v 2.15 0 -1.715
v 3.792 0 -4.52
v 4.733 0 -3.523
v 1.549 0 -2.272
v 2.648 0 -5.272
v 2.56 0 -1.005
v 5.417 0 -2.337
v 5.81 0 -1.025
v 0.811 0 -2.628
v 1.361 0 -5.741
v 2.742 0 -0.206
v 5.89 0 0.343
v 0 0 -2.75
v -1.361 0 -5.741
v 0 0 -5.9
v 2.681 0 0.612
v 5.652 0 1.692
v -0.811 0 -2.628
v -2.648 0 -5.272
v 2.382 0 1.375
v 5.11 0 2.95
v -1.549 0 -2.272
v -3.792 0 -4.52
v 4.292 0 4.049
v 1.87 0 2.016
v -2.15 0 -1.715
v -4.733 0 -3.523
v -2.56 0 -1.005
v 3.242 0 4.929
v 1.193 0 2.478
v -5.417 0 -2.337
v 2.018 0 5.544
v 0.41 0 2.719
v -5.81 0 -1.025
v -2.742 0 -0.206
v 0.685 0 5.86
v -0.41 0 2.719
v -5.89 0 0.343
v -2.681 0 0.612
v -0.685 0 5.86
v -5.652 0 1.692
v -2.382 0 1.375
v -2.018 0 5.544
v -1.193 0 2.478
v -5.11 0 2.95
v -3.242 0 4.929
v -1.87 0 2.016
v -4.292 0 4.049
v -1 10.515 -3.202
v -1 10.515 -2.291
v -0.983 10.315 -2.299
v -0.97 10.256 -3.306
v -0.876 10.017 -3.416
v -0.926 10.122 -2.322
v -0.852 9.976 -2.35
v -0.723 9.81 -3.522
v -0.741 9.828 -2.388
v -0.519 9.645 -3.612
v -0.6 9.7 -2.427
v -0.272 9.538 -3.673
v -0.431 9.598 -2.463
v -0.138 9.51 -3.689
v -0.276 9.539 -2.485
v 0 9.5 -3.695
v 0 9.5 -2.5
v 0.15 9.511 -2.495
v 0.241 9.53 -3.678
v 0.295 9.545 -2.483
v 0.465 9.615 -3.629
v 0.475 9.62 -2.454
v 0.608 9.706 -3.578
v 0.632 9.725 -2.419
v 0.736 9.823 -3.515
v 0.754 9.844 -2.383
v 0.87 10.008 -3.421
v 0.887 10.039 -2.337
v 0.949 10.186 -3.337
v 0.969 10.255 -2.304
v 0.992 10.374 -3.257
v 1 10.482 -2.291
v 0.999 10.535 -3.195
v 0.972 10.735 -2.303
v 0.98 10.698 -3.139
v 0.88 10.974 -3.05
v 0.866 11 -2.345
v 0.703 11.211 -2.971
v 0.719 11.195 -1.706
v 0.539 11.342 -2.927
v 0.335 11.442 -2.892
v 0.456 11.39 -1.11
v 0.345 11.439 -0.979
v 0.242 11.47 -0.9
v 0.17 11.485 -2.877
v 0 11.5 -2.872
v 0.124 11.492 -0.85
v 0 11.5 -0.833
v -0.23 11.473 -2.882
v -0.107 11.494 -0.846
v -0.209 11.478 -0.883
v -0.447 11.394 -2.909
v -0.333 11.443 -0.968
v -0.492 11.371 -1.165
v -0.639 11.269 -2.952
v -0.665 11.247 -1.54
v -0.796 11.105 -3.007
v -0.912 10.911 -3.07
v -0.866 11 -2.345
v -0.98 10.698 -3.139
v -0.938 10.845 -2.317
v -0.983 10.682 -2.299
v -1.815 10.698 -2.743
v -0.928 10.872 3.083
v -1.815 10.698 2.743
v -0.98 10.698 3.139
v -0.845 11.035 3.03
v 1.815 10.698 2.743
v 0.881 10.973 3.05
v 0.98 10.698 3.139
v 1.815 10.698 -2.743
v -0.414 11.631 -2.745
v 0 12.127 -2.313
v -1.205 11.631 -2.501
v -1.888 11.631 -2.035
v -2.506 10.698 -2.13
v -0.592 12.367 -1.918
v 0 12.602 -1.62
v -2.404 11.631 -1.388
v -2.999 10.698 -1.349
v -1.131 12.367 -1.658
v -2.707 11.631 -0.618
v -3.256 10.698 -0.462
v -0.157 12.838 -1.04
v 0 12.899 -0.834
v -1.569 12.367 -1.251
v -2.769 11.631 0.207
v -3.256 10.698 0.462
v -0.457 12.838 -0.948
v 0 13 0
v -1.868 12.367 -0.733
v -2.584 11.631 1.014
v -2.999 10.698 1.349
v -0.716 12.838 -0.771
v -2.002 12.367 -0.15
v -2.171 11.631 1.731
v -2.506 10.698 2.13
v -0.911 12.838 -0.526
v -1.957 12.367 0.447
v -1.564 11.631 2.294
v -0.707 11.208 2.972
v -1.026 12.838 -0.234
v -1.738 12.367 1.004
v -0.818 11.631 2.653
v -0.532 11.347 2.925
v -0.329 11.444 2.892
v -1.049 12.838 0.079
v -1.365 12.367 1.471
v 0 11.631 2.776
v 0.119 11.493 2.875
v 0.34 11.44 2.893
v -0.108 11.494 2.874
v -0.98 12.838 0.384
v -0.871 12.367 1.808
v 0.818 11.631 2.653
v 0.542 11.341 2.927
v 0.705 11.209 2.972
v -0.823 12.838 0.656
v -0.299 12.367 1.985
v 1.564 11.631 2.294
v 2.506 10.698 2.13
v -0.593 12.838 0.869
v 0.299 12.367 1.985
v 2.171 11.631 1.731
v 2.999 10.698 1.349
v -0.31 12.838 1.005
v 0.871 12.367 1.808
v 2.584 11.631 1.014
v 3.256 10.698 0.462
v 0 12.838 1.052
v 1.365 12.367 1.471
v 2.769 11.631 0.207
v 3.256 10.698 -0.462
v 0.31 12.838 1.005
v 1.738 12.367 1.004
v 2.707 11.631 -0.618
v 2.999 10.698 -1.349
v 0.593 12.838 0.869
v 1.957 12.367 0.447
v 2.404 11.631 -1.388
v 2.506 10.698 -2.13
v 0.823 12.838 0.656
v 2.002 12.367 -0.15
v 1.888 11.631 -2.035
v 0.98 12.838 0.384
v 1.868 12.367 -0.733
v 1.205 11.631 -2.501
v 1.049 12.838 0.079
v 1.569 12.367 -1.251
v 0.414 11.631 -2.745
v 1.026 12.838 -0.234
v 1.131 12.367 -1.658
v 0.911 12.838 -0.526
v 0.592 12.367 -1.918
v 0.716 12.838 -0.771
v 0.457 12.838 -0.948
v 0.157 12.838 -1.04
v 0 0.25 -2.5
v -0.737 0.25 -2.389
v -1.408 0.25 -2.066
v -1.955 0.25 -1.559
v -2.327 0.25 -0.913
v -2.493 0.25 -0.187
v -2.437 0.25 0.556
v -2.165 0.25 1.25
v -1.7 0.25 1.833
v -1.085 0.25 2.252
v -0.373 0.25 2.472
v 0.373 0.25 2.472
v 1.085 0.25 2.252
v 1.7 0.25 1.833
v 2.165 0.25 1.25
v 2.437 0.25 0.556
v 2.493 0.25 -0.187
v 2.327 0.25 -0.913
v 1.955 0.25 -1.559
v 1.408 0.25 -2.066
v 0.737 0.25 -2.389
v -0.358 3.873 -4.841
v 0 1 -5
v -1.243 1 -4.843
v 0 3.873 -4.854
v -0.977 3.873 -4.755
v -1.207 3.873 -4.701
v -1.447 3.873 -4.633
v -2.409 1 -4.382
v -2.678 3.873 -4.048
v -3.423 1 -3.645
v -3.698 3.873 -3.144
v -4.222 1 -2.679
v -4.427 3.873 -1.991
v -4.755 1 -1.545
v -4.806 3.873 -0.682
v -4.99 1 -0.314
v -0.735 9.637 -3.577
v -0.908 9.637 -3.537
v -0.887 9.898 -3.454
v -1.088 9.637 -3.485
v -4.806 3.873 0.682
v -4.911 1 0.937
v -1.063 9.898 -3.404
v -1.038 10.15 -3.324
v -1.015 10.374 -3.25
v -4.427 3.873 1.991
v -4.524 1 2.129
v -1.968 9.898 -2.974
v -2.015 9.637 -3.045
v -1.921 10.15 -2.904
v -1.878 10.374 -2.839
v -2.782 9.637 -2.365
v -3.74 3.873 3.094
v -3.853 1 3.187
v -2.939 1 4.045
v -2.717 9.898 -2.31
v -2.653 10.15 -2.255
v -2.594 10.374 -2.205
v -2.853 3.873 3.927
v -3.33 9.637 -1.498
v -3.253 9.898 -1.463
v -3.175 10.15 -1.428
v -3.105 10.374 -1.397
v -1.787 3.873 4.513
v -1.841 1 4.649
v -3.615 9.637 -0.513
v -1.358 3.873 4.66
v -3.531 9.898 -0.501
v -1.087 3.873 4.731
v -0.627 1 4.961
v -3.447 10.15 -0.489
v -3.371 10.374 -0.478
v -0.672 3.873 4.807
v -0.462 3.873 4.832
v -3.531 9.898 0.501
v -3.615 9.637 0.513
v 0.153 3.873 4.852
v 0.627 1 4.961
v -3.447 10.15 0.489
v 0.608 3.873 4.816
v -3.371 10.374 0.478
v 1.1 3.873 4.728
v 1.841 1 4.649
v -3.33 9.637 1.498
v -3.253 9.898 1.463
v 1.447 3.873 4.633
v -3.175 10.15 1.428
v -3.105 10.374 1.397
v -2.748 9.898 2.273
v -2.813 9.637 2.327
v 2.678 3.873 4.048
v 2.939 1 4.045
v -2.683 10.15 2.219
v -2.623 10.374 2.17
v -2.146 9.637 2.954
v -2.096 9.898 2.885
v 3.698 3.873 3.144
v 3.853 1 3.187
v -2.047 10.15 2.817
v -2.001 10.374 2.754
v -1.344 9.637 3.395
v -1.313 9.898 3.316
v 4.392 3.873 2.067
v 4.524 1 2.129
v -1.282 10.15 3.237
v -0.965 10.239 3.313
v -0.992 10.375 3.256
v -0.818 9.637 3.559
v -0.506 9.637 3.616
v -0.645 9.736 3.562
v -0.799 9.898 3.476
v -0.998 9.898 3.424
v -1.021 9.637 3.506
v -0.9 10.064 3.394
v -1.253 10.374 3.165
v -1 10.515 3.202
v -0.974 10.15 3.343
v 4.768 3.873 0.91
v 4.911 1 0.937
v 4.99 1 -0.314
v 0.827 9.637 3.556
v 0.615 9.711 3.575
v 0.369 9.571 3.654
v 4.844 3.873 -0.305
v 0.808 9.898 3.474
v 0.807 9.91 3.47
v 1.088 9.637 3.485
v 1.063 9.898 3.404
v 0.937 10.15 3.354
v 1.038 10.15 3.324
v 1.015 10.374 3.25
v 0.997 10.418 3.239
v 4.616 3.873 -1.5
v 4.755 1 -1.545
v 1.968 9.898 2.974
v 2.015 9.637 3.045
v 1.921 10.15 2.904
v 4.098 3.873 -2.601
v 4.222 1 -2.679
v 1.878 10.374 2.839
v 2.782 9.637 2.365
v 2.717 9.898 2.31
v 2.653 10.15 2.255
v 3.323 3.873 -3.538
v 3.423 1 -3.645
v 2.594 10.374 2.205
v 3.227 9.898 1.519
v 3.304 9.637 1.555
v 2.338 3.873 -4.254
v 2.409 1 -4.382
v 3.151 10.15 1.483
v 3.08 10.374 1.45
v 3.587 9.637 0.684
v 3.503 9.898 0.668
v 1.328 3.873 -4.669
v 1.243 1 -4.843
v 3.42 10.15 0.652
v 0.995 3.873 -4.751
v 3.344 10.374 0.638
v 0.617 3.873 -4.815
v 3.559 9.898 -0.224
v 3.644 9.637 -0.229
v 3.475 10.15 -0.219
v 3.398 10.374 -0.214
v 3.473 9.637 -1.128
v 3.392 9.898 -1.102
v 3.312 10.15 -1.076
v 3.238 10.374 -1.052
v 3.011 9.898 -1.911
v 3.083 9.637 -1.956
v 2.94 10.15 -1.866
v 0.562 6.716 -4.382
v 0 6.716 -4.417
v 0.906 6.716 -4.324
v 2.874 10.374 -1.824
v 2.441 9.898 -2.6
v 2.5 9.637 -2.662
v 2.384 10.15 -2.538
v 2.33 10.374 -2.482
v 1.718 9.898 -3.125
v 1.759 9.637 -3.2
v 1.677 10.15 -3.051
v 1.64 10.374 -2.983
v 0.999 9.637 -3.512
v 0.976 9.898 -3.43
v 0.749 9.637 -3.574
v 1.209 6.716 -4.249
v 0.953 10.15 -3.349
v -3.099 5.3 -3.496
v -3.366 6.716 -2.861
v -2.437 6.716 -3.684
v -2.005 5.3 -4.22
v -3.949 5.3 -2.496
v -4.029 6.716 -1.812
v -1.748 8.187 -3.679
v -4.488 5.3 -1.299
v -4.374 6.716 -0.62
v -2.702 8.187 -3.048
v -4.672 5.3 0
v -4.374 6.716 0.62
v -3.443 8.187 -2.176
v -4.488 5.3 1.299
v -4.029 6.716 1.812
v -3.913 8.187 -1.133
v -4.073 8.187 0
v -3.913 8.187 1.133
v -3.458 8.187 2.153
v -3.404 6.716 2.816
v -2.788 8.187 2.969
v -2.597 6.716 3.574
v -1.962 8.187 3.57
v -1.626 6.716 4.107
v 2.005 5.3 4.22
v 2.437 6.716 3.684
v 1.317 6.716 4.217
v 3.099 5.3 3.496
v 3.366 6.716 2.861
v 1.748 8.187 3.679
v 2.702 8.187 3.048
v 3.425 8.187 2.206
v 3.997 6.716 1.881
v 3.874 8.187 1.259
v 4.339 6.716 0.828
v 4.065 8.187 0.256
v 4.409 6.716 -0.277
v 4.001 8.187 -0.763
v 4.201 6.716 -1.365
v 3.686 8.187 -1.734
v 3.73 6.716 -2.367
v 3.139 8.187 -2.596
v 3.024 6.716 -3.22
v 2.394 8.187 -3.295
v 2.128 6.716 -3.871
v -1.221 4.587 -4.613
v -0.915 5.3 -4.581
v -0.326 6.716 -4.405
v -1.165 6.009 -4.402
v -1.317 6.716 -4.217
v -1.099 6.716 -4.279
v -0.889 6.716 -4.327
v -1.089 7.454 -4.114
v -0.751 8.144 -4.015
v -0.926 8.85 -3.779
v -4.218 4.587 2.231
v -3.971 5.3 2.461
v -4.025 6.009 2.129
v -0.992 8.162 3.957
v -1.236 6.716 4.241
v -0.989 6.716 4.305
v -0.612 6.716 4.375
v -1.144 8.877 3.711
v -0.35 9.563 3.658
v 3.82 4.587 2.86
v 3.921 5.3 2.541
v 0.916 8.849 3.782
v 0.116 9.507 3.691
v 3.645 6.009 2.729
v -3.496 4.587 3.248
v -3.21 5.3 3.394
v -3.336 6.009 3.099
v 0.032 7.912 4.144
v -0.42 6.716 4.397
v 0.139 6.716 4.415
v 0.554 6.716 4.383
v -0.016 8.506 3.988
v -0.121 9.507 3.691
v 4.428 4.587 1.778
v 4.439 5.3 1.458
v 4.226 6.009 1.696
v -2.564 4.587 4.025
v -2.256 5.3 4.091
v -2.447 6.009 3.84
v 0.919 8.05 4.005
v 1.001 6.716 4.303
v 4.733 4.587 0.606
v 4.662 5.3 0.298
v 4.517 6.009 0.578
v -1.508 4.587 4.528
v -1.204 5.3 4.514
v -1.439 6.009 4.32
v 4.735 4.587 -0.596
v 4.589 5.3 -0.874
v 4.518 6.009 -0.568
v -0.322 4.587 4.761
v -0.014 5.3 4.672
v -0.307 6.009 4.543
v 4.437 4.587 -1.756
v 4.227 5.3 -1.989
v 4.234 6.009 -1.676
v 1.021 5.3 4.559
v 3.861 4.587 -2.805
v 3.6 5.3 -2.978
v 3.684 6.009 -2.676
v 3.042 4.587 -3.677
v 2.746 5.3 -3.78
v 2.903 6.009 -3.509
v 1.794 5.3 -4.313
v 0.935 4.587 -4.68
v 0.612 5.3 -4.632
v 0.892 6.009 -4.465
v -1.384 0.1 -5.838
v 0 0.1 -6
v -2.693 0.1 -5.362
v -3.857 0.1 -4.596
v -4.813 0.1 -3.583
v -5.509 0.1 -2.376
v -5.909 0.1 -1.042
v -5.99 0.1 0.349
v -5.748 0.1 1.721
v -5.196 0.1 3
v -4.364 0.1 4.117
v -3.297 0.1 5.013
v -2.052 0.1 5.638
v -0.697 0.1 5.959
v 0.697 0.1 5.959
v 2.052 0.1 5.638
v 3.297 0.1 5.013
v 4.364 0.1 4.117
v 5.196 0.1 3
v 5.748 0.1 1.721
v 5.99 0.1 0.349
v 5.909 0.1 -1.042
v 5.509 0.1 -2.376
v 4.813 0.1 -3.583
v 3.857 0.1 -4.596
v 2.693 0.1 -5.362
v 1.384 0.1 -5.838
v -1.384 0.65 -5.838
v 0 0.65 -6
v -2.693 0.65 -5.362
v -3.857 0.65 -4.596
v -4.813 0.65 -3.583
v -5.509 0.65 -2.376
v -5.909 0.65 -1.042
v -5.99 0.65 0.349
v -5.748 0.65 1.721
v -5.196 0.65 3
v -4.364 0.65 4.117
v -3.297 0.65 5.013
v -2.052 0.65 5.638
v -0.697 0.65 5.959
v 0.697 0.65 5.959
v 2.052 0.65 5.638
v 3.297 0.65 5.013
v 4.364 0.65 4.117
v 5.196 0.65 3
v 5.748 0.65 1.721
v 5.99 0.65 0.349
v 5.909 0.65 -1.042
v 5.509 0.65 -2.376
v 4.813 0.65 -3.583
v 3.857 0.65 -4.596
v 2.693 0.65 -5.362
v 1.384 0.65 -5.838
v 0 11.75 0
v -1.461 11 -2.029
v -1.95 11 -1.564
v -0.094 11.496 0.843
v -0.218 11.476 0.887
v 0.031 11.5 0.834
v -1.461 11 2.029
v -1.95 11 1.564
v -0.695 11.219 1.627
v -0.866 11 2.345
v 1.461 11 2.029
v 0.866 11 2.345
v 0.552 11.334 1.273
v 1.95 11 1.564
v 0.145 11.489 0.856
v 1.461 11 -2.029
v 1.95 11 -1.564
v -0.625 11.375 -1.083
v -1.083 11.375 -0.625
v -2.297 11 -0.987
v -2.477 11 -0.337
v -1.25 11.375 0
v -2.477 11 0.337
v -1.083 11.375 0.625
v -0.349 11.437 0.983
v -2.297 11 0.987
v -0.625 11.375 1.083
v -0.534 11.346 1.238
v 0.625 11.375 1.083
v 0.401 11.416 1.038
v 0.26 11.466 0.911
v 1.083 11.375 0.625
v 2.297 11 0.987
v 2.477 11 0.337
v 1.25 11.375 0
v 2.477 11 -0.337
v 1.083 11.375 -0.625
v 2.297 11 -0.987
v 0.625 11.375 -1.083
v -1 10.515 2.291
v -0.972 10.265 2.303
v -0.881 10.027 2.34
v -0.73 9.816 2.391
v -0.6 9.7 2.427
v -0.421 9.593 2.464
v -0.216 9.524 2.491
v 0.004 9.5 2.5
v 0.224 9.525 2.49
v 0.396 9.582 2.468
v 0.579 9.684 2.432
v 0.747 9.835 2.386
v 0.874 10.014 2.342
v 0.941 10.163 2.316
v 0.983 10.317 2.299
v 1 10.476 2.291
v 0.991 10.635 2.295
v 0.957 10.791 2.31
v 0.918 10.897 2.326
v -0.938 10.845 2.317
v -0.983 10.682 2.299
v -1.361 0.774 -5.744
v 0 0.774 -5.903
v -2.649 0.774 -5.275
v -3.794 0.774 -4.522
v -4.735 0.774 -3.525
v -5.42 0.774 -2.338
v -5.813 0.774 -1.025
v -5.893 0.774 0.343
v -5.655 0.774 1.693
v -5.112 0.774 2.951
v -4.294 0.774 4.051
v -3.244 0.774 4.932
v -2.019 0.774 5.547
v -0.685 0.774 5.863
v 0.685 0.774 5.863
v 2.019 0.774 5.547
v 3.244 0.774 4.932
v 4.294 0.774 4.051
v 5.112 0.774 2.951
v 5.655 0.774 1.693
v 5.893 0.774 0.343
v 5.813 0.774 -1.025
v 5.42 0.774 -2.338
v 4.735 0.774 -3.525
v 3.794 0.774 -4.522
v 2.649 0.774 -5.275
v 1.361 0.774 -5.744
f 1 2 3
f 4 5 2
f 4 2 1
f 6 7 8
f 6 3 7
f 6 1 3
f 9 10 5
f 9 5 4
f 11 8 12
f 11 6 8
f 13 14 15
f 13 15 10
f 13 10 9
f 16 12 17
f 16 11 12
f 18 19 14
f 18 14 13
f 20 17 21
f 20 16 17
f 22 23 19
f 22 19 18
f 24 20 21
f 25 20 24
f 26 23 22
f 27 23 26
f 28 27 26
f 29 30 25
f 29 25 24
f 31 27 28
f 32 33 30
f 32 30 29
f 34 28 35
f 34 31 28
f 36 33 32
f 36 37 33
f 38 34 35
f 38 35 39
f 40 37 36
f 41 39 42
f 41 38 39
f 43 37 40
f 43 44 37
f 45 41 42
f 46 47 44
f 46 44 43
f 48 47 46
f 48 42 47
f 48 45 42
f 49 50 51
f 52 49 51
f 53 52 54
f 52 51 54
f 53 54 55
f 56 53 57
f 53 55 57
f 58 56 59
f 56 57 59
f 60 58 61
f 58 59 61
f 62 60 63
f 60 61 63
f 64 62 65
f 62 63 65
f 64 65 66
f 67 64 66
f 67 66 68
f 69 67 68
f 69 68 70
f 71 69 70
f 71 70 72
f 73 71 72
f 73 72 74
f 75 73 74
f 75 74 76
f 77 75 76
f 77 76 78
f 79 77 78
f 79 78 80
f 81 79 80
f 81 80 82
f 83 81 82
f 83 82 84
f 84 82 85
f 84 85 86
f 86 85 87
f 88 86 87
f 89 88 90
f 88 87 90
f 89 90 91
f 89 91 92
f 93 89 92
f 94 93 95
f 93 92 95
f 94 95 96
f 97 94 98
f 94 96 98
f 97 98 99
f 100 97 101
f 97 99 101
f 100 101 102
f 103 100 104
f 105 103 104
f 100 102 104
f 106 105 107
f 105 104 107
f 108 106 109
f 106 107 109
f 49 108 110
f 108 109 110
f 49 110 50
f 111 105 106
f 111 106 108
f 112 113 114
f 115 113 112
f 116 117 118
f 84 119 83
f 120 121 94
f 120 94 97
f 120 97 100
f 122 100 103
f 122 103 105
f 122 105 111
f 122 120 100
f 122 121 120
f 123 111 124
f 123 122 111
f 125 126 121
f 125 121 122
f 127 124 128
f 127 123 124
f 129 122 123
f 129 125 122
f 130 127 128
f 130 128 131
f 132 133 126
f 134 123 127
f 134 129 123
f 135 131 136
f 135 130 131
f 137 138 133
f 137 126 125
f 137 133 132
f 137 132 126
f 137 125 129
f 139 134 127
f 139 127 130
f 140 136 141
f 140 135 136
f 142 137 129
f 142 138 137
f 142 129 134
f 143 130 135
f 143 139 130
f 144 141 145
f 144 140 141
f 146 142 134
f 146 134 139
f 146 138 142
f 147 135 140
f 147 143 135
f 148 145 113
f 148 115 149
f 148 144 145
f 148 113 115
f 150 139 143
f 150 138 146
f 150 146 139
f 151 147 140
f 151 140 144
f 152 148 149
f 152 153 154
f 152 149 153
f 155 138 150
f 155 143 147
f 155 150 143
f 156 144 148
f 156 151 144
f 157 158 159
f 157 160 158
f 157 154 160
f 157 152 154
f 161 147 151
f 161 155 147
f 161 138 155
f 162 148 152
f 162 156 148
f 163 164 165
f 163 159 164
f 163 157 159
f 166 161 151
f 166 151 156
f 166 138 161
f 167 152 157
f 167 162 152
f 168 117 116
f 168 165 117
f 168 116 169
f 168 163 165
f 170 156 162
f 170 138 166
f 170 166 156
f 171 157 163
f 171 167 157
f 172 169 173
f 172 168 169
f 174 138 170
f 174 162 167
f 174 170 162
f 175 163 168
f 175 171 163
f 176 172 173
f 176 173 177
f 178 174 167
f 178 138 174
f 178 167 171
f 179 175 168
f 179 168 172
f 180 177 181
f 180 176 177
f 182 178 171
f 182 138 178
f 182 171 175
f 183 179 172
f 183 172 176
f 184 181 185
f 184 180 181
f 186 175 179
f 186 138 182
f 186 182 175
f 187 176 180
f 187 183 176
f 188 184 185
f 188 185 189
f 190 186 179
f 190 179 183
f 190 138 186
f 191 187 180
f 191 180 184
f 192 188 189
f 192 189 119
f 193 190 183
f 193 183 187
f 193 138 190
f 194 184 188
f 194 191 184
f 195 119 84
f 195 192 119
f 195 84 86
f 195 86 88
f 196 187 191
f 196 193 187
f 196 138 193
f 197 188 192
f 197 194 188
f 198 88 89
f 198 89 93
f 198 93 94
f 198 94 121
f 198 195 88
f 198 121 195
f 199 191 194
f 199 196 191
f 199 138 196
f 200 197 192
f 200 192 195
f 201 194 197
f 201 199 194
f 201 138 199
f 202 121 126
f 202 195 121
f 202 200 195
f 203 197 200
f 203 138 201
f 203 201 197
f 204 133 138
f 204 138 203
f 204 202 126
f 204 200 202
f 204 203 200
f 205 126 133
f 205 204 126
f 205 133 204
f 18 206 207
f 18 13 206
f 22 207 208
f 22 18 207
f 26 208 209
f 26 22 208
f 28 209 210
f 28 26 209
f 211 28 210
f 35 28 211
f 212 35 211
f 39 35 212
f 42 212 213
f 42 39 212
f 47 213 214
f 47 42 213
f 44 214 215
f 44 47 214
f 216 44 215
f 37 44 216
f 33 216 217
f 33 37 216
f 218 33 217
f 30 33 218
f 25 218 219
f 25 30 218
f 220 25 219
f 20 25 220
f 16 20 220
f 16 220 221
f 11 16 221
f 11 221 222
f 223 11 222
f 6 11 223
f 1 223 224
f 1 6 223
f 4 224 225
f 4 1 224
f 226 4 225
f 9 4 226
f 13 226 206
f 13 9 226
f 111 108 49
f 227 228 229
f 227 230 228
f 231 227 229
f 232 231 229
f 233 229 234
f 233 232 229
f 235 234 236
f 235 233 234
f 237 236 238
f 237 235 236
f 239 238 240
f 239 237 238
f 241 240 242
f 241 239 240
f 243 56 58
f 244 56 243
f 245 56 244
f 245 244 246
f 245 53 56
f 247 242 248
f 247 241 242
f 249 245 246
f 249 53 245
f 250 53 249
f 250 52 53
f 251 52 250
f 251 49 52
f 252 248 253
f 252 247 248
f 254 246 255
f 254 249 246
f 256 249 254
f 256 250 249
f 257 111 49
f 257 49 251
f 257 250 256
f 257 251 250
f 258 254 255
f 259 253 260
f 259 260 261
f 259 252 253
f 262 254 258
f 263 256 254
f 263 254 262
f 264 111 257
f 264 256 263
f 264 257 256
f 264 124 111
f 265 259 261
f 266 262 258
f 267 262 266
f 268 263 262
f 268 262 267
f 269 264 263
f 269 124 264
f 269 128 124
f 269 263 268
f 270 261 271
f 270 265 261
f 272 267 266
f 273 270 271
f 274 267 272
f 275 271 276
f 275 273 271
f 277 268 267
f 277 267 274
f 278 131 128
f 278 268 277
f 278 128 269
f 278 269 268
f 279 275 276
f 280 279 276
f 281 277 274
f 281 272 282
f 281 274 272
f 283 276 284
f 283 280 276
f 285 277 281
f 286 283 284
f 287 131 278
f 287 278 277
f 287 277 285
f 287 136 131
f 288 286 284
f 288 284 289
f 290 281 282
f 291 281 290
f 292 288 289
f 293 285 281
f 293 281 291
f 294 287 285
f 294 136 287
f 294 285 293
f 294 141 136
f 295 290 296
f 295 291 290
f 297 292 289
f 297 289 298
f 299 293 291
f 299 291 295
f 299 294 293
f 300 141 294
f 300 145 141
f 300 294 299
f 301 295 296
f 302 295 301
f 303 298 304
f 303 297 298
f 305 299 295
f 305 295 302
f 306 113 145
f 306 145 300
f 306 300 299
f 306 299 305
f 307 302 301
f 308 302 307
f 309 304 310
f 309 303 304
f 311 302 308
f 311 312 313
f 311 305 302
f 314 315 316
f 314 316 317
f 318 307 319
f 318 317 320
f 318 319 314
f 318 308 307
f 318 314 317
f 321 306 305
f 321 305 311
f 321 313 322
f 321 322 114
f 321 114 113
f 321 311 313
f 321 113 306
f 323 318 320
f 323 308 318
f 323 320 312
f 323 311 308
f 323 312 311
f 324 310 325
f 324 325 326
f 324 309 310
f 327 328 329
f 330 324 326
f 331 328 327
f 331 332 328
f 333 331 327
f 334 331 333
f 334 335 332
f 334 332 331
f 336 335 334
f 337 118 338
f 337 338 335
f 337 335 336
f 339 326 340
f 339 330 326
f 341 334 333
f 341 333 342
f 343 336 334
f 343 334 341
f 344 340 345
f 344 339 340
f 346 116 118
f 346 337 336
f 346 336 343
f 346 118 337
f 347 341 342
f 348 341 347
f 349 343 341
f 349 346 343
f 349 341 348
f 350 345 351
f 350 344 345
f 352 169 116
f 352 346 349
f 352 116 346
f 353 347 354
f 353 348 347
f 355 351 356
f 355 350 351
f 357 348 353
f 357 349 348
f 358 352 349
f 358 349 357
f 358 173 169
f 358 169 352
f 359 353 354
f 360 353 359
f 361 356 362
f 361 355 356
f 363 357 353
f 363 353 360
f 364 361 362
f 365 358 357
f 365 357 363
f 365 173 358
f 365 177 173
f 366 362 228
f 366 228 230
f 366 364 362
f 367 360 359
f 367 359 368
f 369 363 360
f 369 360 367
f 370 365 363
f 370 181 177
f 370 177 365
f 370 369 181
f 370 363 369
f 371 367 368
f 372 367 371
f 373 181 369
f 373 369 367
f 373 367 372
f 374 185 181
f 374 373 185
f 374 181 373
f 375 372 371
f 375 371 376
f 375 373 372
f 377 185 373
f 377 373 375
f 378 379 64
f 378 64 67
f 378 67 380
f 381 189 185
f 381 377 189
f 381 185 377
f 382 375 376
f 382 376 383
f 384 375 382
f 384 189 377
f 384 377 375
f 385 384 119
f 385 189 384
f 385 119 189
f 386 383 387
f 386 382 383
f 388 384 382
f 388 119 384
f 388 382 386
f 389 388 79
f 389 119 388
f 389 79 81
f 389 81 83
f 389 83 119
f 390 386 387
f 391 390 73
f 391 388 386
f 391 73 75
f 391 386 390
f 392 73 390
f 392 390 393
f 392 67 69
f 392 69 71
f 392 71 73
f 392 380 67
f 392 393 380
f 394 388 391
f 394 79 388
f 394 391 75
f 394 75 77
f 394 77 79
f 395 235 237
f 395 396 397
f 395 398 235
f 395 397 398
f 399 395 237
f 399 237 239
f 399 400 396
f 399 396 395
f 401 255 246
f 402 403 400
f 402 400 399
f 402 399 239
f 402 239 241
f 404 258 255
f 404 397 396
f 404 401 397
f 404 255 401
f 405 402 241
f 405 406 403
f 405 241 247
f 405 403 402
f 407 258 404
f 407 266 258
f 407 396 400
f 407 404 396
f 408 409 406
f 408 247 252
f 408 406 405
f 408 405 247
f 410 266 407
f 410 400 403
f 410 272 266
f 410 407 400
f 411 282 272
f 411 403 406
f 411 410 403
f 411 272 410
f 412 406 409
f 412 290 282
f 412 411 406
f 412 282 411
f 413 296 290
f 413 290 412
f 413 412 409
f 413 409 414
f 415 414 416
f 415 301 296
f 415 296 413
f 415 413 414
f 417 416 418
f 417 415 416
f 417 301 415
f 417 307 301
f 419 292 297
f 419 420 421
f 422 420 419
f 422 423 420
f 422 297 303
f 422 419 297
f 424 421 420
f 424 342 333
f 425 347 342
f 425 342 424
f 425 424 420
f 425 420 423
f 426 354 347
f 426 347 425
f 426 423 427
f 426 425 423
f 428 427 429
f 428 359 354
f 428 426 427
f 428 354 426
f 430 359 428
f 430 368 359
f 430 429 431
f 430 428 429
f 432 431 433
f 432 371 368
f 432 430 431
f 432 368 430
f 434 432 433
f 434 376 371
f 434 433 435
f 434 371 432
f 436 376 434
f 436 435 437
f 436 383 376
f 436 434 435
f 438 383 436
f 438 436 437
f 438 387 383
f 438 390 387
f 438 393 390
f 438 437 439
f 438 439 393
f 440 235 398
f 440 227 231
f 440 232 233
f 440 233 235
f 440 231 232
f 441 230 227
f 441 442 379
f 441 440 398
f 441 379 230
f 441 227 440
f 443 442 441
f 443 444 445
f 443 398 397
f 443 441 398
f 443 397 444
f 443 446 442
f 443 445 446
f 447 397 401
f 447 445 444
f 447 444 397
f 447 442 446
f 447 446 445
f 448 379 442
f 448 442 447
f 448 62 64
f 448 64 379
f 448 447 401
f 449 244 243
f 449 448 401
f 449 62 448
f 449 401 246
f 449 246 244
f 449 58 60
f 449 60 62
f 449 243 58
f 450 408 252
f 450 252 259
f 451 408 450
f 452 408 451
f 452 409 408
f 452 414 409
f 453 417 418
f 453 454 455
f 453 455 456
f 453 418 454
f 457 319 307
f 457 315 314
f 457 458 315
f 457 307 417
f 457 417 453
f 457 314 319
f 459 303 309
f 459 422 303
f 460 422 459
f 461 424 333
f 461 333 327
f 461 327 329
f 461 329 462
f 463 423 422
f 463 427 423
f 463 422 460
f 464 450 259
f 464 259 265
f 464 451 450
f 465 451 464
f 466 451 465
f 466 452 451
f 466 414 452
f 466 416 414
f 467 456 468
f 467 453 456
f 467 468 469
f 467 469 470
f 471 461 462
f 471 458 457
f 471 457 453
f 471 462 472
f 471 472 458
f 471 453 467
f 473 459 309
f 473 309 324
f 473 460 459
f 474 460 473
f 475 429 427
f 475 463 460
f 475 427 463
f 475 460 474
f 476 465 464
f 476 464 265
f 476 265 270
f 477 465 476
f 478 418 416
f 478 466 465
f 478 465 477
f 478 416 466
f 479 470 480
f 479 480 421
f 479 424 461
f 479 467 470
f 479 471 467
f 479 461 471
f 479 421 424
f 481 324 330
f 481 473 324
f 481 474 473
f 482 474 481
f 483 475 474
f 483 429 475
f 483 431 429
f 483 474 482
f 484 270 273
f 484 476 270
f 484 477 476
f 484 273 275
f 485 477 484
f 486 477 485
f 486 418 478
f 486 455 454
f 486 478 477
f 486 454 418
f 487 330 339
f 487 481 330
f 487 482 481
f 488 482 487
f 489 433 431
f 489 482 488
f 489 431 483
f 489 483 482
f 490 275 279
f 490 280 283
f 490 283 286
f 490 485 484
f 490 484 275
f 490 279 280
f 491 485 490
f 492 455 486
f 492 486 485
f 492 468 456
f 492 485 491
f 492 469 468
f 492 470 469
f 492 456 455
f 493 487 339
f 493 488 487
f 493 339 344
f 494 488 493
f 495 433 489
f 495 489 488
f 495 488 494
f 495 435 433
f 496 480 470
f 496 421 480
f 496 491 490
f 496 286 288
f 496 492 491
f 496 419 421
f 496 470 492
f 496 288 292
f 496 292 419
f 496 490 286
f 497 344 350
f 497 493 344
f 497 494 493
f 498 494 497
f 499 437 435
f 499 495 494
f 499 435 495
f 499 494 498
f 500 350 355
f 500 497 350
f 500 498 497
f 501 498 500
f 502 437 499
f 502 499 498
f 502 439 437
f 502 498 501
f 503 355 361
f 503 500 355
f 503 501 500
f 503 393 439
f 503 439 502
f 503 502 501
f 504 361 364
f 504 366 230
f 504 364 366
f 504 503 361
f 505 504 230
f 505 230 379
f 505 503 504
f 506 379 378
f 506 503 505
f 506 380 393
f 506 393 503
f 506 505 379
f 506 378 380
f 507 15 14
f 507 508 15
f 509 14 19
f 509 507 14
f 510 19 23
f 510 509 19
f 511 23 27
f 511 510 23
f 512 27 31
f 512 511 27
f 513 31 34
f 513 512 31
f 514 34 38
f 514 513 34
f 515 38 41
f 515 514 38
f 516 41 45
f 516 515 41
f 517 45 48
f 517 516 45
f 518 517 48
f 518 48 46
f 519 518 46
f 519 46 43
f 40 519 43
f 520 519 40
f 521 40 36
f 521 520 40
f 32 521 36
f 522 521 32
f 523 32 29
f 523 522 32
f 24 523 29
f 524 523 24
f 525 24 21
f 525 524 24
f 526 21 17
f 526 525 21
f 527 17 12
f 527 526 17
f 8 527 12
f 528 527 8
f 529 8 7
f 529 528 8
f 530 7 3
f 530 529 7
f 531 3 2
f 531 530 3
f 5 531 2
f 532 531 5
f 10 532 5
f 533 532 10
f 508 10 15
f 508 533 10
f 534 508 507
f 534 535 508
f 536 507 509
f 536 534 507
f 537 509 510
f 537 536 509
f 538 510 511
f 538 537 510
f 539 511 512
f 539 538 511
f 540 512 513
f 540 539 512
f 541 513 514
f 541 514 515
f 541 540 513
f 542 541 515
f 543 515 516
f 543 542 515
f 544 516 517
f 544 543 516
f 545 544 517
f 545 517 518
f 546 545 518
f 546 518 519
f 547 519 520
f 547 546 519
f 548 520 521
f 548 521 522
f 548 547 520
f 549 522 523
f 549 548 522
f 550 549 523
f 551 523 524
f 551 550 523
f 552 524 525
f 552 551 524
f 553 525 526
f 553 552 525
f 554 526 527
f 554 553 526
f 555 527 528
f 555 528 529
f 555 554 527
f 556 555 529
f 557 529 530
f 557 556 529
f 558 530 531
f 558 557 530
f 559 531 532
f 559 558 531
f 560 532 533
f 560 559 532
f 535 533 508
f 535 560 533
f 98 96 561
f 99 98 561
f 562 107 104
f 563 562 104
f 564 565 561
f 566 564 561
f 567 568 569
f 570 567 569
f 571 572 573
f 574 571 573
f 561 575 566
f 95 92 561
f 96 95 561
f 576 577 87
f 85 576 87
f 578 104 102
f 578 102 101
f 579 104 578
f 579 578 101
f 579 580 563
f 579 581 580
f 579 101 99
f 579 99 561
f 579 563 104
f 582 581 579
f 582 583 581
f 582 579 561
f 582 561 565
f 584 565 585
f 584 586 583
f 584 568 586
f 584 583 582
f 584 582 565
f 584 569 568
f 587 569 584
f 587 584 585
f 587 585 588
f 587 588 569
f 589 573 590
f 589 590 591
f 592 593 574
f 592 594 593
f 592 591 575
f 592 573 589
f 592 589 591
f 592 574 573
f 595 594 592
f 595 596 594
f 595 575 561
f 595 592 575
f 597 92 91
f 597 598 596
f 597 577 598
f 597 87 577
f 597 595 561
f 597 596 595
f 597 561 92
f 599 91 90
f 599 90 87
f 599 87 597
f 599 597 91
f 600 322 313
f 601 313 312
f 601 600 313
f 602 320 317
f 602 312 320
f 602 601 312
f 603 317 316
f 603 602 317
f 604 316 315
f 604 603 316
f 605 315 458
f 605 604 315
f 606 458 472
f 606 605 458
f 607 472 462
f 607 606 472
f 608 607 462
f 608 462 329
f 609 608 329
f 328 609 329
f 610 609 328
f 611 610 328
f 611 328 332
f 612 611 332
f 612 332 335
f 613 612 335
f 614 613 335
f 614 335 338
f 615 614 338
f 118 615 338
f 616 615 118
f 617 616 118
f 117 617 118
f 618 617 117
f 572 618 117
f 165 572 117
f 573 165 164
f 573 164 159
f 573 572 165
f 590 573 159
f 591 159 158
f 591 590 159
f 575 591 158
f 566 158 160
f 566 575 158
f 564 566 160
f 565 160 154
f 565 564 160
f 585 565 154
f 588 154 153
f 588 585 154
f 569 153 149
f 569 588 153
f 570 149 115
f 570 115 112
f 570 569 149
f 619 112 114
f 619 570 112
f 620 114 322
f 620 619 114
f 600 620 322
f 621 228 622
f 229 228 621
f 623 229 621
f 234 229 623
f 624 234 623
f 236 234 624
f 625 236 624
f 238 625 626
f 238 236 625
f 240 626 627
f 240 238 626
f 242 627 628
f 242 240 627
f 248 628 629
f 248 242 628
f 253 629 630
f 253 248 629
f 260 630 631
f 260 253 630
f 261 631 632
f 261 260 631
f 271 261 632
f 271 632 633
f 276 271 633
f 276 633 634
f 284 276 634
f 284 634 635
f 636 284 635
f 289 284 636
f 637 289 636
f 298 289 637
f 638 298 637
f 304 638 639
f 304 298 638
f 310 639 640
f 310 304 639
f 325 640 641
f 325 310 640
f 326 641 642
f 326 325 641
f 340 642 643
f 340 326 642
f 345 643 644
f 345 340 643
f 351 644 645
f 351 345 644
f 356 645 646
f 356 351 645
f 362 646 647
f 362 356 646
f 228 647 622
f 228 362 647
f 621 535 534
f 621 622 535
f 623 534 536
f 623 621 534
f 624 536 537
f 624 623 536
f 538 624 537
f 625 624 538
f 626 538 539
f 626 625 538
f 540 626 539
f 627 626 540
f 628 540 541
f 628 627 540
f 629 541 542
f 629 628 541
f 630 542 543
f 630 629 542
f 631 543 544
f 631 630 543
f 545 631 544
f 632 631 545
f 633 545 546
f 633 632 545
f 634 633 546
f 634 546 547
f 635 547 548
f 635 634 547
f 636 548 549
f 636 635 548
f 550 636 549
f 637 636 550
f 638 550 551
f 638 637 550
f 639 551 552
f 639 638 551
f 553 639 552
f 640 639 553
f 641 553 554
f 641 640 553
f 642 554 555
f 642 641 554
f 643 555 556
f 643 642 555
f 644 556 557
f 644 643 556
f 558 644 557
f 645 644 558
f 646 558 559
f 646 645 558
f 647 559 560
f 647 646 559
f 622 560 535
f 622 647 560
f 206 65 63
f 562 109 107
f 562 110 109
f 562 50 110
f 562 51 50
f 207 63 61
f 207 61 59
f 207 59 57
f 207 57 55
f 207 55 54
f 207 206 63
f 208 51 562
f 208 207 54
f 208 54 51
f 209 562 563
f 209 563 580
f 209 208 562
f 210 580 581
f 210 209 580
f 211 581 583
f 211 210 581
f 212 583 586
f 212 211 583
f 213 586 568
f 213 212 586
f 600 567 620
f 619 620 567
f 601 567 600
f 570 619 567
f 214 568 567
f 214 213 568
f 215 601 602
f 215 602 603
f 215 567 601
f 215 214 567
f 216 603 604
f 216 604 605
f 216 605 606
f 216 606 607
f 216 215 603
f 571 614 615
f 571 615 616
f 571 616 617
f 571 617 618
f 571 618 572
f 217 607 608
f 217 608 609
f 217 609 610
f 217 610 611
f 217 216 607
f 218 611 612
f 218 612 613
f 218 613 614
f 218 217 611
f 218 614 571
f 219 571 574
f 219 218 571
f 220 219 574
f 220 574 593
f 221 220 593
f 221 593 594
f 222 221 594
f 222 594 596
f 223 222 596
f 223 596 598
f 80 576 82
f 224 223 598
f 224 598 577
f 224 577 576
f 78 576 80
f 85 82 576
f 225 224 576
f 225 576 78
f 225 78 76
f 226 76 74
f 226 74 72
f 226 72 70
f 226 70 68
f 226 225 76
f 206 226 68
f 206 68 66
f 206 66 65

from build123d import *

# Parameters (mm, degrees)
CUT_EXTRUDE1_REACH             = 17.524
SKETCH2_R                      = 1
CUT_EXTRUDE1_DIRECTION_2_REACH = 17.524


with BuildPart() as part:
    # Sketch1 → Revolve1 (revolve)
    with BuildSketch(Plane.XY, mode=Mode.PRIVATE) as revolve1_sk:
        with BuildLine():
            Line((2.75, 0), (5.9, 0))
            Line((5.9, 0), (6, 0.1))
            Line((6, 0.1), (6, 0.65))
            Line((6, 0.65), (5.90298575, 0.774253563))
            Line((5.90298575, 0.774253563), (5, 1))
            ThreePointArc((5, 1), (4.5688675, 5.923917794), (3.288590604, 10.697986577))
            ThreePointArc((3.288590604, 10.697986577), (2.007118205, 12.367311722), (0, 13))
            Line((0, 13), (0, 11.75))
            Line((0, 11.75), (2.5, 11))
            Line((2.5, 11), (2.5, 0.25))
            Line((2.5, 0.25), (2.75, 0))
        make_face()
    revolve(revolve1_sk.sketch.rotate(Axis((0, 11.75, 0), (0, 1, 0)), 90), axis=Axis((0, 11.75, 0), (0, 1, 0)))

    # Sketch2 → Cut-Extrude1 (cut, up to next)
    with BuildSketch(Plane.XY, mode=Mode.PRIVATE) as cut_extrude1_sk1:
        with Locations(Location((0, 10.5, 0), (0, 0, 179.156103364))):
            Circle(SKETCH2_R)
    cut_extrude1_tool1 = extrude(cut_extrude1_sk1.sketch, amount=-CUT_EXTRUDE1_REACH, mode=Mode.PRIVATE) & part.part
    add(cut_extrude1_tool1.solids().sort_by_distance((0, 10.5, 0))[0], mode=Mode.SUBTRACT)

    # Sketch2 → Cut-Extrude1 direction 2 (cut, up to next)
    with BuildSketch(Plane.XY, mode=Mode.PRIVATE) as cut_extrude1_direction_2_sk1:
        with Locations(Location((0, 10.5, 0), (0, 0, 179.156103364))):
            Circle(SKETCH2_R)
    cut_extrude1_direction_2_tool1 = extrude(cut_extrude1_direction_2_sk1.sketch, amount=CUT_EXTRUDE1_DIRECTION_2_REACH, mode=Mode.PRIVATE) & part.part
    add(cut_extrude1_direction_2_tool1.solids().sort_by_distance((0, 10.5, 0))[0], mode=Mode.SUBTRACT)


solid = part.part
